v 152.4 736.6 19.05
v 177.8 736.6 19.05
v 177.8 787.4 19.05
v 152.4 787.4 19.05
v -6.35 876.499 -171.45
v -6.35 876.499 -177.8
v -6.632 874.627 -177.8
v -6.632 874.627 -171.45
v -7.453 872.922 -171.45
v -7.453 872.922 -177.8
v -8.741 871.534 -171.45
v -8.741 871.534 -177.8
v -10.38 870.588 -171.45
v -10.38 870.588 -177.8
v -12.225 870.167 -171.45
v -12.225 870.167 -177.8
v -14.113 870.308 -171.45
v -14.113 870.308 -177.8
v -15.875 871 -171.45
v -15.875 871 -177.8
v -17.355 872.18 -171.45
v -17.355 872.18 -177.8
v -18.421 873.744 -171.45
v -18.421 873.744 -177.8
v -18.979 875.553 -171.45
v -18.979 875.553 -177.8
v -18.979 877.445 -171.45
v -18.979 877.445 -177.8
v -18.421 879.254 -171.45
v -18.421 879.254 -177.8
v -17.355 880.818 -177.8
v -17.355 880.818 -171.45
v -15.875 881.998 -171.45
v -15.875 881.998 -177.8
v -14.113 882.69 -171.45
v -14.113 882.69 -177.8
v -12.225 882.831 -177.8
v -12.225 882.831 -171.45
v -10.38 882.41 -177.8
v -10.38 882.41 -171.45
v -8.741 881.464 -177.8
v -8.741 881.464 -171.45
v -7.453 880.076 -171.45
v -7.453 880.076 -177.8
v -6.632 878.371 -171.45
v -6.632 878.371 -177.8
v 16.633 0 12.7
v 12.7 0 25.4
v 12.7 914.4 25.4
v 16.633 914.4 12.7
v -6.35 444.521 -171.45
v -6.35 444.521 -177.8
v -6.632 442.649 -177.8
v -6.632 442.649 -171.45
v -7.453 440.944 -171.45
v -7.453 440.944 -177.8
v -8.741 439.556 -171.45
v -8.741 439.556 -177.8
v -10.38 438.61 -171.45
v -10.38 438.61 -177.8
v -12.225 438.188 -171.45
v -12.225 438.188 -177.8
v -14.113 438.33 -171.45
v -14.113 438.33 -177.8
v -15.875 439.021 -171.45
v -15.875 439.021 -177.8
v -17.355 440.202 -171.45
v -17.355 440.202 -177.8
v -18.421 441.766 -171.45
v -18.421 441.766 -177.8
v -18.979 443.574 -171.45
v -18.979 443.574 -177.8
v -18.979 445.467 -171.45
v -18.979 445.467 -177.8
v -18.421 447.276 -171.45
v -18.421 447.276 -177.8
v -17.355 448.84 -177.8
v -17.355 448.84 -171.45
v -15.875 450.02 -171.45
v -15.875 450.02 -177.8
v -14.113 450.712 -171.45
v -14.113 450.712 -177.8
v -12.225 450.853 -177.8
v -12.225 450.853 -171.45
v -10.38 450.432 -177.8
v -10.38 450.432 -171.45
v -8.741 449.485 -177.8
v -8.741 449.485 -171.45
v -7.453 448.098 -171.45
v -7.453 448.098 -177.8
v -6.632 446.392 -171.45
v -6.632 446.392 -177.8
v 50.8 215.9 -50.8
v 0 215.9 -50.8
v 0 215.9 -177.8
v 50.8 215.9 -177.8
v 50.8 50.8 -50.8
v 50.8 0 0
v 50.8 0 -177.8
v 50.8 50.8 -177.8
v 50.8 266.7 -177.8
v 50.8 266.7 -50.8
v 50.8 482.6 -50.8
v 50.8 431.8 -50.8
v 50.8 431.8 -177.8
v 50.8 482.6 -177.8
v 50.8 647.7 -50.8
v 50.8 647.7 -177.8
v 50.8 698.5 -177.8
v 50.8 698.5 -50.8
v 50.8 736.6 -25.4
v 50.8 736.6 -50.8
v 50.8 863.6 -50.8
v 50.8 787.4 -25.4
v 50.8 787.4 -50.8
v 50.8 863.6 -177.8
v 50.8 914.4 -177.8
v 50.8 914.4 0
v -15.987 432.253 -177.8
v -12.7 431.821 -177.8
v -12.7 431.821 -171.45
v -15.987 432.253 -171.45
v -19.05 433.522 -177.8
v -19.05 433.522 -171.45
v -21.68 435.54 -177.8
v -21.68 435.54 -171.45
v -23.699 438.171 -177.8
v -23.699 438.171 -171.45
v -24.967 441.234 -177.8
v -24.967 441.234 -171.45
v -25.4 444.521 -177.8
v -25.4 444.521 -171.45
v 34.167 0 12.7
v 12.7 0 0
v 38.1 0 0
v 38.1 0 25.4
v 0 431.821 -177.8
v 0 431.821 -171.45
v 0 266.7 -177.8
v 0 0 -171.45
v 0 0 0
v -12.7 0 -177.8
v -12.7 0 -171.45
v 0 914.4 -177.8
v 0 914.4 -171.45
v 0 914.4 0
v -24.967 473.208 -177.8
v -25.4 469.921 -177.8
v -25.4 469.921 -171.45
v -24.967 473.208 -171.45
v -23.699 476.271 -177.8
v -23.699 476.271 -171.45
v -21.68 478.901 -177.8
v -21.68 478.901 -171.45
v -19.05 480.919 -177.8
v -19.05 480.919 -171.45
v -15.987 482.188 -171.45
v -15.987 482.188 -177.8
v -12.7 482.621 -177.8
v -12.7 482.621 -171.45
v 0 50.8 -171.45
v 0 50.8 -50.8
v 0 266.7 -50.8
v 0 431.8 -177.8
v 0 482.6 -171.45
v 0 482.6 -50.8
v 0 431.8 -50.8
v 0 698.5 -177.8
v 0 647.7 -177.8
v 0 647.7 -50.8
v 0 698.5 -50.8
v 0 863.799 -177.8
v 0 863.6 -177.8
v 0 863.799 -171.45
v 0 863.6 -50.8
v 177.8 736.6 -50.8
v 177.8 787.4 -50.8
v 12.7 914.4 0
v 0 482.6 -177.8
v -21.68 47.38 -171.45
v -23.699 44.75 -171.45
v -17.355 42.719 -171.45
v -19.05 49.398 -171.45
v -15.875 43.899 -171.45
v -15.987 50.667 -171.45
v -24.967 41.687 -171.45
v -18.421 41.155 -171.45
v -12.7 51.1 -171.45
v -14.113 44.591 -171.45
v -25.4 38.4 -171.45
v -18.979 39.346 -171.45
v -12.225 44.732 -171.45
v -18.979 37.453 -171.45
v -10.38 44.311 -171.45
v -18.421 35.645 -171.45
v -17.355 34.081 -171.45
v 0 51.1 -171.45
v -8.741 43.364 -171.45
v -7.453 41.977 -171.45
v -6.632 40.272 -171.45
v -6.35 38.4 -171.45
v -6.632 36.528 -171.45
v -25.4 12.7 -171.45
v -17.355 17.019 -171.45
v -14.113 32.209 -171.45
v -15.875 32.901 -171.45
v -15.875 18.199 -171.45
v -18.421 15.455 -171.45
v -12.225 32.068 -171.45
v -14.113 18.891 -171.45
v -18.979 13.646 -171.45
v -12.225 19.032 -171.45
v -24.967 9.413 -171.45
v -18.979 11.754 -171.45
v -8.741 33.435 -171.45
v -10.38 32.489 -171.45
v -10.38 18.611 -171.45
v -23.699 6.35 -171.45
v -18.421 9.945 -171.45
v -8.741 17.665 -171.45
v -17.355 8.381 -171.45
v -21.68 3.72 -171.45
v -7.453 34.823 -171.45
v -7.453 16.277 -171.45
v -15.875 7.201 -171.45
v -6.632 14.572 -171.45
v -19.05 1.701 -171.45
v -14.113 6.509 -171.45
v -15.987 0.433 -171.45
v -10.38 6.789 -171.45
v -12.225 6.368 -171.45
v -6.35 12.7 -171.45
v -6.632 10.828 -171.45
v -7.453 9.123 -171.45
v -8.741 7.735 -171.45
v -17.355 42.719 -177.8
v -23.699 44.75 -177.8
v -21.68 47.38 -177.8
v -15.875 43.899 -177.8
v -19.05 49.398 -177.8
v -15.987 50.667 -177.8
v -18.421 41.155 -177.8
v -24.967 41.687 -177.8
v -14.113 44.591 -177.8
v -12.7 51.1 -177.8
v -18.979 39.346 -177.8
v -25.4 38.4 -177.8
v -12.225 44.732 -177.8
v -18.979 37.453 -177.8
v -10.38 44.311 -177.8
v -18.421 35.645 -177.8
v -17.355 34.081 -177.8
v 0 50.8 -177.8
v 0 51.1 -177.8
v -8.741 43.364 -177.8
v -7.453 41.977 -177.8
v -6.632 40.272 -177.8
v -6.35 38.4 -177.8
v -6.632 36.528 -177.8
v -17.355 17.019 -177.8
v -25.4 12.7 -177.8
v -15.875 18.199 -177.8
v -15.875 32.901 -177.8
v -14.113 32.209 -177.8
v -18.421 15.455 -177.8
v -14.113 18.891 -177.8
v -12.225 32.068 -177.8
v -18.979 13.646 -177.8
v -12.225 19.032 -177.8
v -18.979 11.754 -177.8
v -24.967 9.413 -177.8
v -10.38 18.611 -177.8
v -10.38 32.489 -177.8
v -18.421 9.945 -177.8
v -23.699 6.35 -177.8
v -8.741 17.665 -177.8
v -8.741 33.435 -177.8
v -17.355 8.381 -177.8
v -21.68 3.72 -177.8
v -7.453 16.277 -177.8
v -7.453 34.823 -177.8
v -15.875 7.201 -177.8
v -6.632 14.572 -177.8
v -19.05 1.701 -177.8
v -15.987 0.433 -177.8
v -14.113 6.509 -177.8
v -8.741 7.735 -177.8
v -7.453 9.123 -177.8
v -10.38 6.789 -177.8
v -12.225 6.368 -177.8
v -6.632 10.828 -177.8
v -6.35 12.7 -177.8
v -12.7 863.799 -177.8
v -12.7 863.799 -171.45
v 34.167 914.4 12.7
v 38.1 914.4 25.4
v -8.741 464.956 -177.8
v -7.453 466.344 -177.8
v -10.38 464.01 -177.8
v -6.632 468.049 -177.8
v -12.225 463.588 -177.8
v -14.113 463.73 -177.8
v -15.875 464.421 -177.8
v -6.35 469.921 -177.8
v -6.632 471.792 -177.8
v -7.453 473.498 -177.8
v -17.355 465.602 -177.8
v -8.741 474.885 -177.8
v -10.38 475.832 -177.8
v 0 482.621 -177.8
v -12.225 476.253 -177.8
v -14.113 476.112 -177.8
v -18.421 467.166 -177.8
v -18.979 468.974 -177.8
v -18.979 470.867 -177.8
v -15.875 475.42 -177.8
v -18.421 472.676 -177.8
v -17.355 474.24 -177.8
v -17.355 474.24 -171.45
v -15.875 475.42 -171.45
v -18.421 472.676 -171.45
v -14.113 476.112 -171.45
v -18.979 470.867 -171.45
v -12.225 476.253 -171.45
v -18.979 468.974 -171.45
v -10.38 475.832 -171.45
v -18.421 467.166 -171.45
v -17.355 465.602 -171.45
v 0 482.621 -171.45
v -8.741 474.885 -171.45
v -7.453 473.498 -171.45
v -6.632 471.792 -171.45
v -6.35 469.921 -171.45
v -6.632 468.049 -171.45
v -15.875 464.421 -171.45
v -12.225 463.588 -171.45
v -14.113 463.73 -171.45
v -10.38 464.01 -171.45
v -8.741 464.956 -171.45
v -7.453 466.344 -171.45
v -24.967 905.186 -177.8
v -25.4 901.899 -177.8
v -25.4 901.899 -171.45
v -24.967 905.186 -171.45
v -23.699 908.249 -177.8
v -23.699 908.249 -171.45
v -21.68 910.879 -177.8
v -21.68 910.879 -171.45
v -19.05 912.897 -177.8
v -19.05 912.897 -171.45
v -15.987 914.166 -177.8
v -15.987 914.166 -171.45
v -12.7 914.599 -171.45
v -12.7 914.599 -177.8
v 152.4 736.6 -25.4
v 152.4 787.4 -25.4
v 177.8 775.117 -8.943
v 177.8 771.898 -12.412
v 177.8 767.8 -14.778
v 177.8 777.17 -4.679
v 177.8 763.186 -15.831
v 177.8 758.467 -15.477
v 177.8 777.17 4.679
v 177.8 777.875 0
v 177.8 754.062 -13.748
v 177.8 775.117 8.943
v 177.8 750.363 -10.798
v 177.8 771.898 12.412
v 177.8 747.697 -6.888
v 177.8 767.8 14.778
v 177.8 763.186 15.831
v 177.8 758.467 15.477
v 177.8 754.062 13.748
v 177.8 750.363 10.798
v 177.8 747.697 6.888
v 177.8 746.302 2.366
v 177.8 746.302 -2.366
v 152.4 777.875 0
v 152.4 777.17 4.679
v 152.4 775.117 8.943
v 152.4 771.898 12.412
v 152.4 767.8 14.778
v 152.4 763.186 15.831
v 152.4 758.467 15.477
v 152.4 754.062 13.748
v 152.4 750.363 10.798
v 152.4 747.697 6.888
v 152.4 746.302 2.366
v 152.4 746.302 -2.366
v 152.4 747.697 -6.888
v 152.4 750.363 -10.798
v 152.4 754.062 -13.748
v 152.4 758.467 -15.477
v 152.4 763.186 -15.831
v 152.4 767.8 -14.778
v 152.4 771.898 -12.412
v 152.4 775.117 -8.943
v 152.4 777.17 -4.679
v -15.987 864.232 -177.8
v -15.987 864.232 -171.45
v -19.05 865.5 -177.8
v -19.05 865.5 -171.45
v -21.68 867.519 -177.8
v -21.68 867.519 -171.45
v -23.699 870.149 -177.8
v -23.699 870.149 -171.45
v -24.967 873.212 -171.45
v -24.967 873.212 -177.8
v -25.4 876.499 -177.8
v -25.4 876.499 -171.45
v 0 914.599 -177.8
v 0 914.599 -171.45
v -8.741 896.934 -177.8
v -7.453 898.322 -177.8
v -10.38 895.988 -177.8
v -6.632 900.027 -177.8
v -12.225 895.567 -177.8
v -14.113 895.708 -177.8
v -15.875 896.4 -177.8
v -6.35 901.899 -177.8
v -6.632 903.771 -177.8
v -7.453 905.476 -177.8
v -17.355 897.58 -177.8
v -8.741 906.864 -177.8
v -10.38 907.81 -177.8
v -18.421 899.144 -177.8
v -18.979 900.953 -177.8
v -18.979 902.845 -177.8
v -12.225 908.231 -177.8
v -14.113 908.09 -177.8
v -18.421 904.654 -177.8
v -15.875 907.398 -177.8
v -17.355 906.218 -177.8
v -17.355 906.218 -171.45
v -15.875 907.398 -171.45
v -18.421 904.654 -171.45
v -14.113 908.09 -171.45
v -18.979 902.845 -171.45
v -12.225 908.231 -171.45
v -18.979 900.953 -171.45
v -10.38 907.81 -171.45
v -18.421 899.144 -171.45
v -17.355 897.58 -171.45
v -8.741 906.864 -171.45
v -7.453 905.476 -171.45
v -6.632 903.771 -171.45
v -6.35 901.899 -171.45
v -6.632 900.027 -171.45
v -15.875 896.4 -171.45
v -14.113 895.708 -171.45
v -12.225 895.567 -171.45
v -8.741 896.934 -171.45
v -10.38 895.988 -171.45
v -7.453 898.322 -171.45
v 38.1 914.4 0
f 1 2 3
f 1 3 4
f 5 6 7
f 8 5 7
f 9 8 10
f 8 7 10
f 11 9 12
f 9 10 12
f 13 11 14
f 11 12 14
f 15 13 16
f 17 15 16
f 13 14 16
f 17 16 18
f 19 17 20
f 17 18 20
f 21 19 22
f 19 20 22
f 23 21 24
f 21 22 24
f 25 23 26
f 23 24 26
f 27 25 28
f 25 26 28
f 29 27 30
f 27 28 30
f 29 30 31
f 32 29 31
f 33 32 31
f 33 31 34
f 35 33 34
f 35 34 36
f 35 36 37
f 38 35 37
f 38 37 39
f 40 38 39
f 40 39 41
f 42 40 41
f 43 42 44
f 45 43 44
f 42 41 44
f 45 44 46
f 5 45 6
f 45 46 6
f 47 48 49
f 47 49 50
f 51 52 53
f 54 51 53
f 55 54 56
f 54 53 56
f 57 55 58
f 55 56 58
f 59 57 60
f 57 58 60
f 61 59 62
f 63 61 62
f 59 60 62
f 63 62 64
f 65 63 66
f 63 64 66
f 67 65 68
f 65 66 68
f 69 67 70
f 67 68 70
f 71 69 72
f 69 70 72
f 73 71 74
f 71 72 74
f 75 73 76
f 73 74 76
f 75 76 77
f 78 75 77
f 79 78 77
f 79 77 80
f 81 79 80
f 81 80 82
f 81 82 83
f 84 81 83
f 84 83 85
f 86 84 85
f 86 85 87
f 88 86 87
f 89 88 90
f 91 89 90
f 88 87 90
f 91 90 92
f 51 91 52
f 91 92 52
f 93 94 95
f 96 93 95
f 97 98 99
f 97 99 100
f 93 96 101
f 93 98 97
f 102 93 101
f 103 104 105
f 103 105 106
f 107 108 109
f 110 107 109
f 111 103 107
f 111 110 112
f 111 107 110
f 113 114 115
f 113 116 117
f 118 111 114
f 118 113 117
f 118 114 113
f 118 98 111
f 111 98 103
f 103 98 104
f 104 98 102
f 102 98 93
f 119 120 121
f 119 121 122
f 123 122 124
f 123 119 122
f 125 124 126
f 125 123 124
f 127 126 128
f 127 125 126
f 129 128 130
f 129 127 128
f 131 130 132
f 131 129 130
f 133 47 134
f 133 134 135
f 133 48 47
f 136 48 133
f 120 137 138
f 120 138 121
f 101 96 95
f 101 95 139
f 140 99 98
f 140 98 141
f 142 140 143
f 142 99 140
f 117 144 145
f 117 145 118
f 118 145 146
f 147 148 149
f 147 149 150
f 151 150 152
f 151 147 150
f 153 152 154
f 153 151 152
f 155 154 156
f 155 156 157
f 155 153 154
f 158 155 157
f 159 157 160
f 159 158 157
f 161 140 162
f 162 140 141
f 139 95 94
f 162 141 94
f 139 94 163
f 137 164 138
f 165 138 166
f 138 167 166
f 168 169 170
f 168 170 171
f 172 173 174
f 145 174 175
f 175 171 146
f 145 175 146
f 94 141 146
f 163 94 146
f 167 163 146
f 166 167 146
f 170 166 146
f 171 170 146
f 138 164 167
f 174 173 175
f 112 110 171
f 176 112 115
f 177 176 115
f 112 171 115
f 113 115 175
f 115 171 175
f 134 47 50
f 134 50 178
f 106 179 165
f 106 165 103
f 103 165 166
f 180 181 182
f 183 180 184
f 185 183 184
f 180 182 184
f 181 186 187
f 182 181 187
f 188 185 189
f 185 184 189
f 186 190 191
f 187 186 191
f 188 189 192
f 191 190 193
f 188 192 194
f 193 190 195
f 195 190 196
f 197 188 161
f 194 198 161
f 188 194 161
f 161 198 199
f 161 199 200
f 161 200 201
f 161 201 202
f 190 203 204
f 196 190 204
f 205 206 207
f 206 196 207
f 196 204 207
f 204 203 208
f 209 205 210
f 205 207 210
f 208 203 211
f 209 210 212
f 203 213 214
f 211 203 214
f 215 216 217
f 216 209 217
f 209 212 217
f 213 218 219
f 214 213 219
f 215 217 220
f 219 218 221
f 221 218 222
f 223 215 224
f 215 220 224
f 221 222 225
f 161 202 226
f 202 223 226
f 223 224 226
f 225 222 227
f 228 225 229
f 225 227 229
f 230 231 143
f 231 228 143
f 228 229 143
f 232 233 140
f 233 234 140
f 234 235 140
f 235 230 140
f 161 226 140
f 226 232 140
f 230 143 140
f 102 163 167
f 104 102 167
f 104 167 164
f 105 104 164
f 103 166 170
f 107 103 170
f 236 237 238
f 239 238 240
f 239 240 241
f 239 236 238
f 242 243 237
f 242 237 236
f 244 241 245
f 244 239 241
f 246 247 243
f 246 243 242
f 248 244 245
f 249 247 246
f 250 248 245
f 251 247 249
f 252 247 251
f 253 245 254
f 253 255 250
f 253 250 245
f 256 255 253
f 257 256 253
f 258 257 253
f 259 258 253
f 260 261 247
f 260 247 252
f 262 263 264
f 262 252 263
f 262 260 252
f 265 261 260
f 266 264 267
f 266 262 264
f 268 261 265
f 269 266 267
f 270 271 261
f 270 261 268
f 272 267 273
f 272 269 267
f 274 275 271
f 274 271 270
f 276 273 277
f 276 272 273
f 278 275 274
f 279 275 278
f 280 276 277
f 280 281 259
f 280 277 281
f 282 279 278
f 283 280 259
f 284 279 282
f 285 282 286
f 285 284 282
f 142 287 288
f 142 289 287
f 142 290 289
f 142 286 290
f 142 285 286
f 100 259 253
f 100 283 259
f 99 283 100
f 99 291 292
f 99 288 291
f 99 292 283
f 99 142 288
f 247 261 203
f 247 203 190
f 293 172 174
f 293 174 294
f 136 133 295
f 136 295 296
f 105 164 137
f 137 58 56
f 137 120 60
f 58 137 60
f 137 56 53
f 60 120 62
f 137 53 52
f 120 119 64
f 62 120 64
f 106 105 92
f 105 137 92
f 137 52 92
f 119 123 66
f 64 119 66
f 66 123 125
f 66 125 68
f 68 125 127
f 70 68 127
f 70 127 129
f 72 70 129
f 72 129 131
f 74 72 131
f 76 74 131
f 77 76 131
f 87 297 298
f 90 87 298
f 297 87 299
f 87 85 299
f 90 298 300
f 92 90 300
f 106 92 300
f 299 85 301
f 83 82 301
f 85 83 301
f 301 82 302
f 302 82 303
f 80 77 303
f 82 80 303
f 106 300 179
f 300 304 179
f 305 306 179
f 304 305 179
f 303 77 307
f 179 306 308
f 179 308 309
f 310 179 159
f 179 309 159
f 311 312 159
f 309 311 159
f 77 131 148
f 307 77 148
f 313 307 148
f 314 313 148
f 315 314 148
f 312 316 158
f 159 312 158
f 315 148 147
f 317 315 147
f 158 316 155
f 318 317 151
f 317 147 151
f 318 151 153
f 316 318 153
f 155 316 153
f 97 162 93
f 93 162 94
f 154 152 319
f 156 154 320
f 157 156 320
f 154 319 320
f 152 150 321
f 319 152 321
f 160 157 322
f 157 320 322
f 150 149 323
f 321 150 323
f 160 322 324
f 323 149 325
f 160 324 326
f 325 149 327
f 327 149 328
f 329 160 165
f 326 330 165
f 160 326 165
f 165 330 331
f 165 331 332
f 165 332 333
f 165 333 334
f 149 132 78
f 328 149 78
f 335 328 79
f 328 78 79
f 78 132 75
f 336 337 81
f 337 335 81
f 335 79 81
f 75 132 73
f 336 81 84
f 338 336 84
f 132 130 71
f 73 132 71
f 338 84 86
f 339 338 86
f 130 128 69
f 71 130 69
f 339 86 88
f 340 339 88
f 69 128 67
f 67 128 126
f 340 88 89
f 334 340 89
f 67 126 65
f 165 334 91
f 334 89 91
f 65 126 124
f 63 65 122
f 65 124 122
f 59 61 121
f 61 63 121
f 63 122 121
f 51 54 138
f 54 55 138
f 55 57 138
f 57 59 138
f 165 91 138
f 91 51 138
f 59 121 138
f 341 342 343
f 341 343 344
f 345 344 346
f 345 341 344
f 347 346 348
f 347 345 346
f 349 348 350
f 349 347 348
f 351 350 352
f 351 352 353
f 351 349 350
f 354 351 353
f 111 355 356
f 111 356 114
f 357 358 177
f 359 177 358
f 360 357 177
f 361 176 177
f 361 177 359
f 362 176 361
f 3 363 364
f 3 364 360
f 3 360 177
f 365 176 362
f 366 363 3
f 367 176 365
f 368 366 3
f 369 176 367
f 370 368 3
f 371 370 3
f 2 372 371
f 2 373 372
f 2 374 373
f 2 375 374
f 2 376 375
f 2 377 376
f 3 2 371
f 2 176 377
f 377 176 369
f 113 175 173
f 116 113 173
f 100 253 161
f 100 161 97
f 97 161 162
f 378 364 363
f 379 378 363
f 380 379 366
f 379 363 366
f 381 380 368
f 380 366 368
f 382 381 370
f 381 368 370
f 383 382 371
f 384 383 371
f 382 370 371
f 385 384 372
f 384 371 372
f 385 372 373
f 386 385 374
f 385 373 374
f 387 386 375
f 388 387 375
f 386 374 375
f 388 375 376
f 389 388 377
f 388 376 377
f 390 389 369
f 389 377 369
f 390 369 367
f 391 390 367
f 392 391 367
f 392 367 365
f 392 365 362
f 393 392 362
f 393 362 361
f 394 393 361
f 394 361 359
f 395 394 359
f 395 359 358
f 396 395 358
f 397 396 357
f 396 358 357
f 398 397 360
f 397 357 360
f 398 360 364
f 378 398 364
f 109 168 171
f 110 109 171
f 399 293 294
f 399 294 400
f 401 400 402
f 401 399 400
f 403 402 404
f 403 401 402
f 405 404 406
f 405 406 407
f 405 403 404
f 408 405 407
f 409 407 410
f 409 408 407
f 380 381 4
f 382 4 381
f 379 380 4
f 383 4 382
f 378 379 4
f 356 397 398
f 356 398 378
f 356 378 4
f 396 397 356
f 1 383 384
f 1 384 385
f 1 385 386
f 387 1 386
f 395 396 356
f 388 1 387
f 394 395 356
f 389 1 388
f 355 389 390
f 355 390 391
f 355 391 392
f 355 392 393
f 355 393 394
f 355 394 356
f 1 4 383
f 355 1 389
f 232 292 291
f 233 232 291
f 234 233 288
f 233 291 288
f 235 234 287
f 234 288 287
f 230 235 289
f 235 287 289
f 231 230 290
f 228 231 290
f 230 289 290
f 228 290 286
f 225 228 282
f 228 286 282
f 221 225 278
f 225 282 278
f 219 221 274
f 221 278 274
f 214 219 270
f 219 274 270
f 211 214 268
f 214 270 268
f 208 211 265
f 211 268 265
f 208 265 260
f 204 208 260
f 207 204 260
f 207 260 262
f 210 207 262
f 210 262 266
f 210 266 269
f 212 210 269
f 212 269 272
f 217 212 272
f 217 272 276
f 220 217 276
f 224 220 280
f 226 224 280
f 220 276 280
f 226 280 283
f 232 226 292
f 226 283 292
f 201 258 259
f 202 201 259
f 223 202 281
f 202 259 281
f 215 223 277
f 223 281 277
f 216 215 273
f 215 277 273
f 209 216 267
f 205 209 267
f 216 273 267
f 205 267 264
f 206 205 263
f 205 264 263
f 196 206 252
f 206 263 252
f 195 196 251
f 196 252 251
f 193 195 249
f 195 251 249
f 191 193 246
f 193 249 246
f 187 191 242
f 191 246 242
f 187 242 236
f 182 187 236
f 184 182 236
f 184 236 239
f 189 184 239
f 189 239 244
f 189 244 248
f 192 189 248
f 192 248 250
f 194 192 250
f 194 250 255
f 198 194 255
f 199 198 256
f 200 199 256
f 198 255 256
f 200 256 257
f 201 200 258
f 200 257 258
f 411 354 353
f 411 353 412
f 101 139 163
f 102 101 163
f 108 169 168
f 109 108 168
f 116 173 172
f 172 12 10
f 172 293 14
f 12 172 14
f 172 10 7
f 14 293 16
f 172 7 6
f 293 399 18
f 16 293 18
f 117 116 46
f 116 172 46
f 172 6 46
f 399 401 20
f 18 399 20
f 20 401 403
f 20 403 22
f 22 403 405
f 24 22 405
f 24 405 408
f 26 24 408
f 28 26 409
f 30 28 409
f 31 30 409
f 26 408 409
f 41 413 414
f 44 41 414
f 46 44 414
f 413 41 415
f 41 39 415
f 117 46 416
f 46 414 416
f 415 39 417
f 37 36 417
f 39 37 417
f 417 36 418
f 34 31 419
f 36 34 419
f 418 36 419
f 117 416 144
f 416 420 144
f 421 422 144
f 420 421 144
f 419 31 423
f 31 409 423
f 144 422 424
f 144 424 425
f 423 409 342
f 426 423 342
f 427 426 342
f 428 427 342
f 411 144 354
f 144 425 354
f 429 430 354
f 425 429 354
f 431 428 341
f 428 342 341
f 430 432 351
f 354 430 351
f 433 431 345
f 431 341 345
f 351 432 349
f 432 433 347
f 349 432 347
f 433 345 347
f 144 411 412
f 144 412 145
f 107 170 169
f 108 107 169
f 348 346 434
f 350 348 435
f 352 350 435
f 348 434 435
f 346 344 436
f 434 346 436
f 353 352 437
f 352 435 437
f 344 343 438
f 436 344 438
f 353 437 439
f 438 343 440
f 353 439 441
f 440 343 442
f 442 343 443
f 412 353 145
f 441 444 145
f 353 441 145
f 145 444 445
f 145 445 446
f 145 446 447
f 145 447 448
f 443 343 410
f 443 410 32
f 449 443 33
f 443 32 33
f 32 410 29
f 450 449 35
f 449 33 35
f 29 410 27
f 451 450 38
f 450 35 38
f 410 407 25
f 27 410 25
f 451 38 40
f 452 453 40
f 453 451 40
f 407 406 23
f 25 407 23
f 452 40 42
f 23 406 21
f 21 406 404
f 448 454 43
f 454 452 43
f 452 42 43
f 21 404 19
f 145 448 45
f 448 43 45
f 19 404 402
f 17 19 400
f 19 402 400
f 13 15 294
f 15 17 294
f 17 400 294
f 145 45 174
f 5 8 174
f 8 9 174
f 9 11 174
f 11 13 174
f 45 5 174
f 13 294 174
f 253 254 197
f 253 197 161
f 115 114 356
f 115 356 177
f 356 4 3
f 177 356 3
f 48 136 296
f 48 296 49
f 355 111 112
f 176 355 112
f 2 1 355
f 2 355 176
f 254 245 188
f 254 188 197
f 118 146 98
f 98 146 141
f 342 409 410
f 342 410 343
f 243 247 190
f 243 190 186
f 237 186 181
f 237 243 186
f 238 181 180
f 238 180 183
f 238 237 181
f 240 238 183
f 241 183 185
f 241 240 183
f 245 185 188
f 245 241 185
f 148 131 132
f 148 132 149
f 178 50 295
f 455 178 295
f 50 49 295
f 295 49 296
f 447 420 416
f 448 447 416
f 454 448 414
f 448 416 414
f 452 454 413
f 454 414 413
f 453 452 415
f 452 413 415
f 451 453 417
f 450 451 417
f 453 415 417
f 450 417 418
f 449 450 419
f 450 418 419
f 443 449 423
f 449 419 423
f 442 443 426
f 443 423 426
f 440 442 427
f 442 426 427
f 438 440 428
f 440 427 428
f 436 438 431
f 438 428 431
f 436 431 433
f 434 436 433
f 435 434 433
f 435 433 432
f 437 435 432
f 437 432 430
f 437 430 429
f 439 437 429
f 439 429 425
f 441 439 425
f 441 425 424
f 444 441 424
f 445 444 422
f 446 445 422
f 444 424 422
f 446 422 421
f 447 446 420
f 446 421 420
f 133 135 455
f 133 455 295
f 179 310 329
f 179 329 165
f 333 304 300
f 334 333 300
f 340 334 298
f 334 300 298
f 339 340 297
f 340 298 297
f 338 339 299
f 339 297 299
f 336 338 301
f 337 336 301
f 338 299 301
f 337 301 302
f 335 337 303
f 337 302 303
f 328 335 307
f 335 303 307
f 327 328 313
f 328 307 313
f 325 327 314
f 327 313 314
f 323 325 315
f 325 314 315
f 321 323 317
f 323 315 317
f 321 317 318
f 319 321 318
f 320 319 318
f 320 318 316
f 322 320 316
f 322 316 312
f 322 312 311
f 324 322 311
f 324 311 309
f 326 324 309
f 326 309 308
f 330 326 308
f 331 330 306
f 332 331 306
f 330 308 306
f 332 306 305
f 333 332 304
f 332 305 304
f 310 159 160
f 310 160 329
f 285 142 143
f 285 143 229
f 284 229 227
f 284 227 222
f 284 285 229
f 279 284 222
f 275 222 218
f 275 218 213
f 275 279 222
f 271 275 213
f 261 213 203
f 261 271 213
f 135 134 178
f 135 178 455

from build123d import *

# Parameters (mm, degrees)
F1_DEPTH  = 50.8
F3_DEPTH  = 914.4
F6_DEPTH  = 50.8
F8_R      = 15.875
F9_DEPTH  = 25.4
F11_R     = 6.35
F12_DEPTH = 6.35


with BuildPart() as f1:
    # F0 (on Right) → F1 (new body)
    with BuildSketch(Plane.YZ):
        Polygon((914.4, 0), (0, 0), (0, -177.8), (50.8, -177.8), (50.8, -50.8), (215.9, -50.8), (215.9, -177.8), (266.7, -177.8), (266.7, -50.8), (431.8, -50.8), (431.8, -177.8), (482.6, -177.8), (482.6, -50.8), (647.7, -50.8), (647.7, -177.8), (698.5, -177.8), (698.5, -50.8), (863.6, -50.8), (863.6, -177.8), (914.4, -177.8), align=None)
    extrude(amount=F1_DEPTH)

    # F5 (on offset) → F6 (join)
    with BuildSketch(Plane.XZ.offset(-736.6)):
        Polygon((50.8, -25.4), (50.8, -50.8), (177.8, -50.8), (177.8, 19.05), (152.4, 19.05), (152.4, -25.4), align=None)
    extrude(amount=-F6_DEPTH)

    # F8 (on offset) → F9 (cut)
    with BuildSketch(Plane.YZ.offset(177.8)):
        with Locations((762, 0)):
            Circle(F8_R)
    extrude(amount=-F9_DEPTH, mode=Mode.SUBTRACT)

    # F11 (on offset) → F12 (join)
    with BuildSketch(Plane(origin=(0, 0, -177.8), x_dir=(1, 0, 0), z_dir=(0, 0, -1))):
        with BuildLine():
            Line((0, -51.0998591781), (0, 0))
            Line((0, 0), (-12.7, 0))
            ThreePointArc((-12.7, 0), (-21.6802561211, -3.7197438789), (-25.4, -12.7))
            Line((-25.4, -12.7), (-25.4, -38.3998591781))
            ThreePointArc((-25.4, -38.3998591781), (-21.6802561211, -47.3801152991), (-12.7, -51.0998591781))
            Line((-12.7, -51.0998591781), (0, -51.0998591781))
        make_face()
        with Locations((-12.7, -38.3998591781)):
            Circle(F11_R, mode=Mode.SUBTRACT)
        with Locations((-12.7, -12.7)):
            Circle(F11_R, mode=Mode.SUBTRACT)
        with BuildLine():
            Line((0, -914.598941803), (0, -863.798941803))
            Line((0, -863.798941803), (-12.7, -863.798941803))
            ThreePointArc((-12.7, -863.798941803), (-21.6802561211, -867.5186856819), (-25.4, -876.498941803))
            Line((-25.4, -876.498941803), (-25.4, -901.898941803))
            ThreePointArc((-25.4, -901.898941803), (-21.6802561211, -910.879197924), (-12.7, -914.598941803))
            Line((-12.7, -914.598941803), (0, -914.598941803))
        make_face()
        with Locations((-12.7, -901.898941803)):
            Circle(F11_R, mode=Mode.SUBTRACT)
        with Locations((-12.7, -876.498941803)):
            Circle(F11_R, mode=Mode.SUBTRACT)
        with BuildLine():
            Line((0, -482.620716095), (0, -431.820716095))
            Line((0, -431.820716095), (-12.7, -431.820716095))
            ThreePointArc((-12.7, -431.820716095), (-21.6802561211, -435.5404599739), (-25.4, -444.520716095))
            Line((-25.4, -444.520716095), (-25.4, -469.920716095))
            ThreePointArc((-25.4, -469.920716095), (-21.6802561211, -478.900972216), (-12.7, -482.620716095))
            Line((-12.7, -482.620716095), (0, -482.620716095))
        make_face()
        with Locations((-12.7, -469.920716095)):
            Circle(F11_R, mode=Mode.SUBTRACT)
        with Locations((-12.7, -444.520716095)):
            Circle(F11_R, mode=Mode.SUBTRACT)
    extrude(amount=-F12_DEPTH)


with BuildPart() as f3:
    # F2 (on Front) → F3 (new body)
    with BuildSketch(Plane.XZ):
        Polygon((16.6332703084, 12.7), (12.7, 0), (38.1, 0), (34.1667296916, 12.7), (38.1, 25.4), (12.7, 25.4), align=None)
    extrude(amount=-F3_DEPTH)


solid = Compound([f1.part, f3.part])
